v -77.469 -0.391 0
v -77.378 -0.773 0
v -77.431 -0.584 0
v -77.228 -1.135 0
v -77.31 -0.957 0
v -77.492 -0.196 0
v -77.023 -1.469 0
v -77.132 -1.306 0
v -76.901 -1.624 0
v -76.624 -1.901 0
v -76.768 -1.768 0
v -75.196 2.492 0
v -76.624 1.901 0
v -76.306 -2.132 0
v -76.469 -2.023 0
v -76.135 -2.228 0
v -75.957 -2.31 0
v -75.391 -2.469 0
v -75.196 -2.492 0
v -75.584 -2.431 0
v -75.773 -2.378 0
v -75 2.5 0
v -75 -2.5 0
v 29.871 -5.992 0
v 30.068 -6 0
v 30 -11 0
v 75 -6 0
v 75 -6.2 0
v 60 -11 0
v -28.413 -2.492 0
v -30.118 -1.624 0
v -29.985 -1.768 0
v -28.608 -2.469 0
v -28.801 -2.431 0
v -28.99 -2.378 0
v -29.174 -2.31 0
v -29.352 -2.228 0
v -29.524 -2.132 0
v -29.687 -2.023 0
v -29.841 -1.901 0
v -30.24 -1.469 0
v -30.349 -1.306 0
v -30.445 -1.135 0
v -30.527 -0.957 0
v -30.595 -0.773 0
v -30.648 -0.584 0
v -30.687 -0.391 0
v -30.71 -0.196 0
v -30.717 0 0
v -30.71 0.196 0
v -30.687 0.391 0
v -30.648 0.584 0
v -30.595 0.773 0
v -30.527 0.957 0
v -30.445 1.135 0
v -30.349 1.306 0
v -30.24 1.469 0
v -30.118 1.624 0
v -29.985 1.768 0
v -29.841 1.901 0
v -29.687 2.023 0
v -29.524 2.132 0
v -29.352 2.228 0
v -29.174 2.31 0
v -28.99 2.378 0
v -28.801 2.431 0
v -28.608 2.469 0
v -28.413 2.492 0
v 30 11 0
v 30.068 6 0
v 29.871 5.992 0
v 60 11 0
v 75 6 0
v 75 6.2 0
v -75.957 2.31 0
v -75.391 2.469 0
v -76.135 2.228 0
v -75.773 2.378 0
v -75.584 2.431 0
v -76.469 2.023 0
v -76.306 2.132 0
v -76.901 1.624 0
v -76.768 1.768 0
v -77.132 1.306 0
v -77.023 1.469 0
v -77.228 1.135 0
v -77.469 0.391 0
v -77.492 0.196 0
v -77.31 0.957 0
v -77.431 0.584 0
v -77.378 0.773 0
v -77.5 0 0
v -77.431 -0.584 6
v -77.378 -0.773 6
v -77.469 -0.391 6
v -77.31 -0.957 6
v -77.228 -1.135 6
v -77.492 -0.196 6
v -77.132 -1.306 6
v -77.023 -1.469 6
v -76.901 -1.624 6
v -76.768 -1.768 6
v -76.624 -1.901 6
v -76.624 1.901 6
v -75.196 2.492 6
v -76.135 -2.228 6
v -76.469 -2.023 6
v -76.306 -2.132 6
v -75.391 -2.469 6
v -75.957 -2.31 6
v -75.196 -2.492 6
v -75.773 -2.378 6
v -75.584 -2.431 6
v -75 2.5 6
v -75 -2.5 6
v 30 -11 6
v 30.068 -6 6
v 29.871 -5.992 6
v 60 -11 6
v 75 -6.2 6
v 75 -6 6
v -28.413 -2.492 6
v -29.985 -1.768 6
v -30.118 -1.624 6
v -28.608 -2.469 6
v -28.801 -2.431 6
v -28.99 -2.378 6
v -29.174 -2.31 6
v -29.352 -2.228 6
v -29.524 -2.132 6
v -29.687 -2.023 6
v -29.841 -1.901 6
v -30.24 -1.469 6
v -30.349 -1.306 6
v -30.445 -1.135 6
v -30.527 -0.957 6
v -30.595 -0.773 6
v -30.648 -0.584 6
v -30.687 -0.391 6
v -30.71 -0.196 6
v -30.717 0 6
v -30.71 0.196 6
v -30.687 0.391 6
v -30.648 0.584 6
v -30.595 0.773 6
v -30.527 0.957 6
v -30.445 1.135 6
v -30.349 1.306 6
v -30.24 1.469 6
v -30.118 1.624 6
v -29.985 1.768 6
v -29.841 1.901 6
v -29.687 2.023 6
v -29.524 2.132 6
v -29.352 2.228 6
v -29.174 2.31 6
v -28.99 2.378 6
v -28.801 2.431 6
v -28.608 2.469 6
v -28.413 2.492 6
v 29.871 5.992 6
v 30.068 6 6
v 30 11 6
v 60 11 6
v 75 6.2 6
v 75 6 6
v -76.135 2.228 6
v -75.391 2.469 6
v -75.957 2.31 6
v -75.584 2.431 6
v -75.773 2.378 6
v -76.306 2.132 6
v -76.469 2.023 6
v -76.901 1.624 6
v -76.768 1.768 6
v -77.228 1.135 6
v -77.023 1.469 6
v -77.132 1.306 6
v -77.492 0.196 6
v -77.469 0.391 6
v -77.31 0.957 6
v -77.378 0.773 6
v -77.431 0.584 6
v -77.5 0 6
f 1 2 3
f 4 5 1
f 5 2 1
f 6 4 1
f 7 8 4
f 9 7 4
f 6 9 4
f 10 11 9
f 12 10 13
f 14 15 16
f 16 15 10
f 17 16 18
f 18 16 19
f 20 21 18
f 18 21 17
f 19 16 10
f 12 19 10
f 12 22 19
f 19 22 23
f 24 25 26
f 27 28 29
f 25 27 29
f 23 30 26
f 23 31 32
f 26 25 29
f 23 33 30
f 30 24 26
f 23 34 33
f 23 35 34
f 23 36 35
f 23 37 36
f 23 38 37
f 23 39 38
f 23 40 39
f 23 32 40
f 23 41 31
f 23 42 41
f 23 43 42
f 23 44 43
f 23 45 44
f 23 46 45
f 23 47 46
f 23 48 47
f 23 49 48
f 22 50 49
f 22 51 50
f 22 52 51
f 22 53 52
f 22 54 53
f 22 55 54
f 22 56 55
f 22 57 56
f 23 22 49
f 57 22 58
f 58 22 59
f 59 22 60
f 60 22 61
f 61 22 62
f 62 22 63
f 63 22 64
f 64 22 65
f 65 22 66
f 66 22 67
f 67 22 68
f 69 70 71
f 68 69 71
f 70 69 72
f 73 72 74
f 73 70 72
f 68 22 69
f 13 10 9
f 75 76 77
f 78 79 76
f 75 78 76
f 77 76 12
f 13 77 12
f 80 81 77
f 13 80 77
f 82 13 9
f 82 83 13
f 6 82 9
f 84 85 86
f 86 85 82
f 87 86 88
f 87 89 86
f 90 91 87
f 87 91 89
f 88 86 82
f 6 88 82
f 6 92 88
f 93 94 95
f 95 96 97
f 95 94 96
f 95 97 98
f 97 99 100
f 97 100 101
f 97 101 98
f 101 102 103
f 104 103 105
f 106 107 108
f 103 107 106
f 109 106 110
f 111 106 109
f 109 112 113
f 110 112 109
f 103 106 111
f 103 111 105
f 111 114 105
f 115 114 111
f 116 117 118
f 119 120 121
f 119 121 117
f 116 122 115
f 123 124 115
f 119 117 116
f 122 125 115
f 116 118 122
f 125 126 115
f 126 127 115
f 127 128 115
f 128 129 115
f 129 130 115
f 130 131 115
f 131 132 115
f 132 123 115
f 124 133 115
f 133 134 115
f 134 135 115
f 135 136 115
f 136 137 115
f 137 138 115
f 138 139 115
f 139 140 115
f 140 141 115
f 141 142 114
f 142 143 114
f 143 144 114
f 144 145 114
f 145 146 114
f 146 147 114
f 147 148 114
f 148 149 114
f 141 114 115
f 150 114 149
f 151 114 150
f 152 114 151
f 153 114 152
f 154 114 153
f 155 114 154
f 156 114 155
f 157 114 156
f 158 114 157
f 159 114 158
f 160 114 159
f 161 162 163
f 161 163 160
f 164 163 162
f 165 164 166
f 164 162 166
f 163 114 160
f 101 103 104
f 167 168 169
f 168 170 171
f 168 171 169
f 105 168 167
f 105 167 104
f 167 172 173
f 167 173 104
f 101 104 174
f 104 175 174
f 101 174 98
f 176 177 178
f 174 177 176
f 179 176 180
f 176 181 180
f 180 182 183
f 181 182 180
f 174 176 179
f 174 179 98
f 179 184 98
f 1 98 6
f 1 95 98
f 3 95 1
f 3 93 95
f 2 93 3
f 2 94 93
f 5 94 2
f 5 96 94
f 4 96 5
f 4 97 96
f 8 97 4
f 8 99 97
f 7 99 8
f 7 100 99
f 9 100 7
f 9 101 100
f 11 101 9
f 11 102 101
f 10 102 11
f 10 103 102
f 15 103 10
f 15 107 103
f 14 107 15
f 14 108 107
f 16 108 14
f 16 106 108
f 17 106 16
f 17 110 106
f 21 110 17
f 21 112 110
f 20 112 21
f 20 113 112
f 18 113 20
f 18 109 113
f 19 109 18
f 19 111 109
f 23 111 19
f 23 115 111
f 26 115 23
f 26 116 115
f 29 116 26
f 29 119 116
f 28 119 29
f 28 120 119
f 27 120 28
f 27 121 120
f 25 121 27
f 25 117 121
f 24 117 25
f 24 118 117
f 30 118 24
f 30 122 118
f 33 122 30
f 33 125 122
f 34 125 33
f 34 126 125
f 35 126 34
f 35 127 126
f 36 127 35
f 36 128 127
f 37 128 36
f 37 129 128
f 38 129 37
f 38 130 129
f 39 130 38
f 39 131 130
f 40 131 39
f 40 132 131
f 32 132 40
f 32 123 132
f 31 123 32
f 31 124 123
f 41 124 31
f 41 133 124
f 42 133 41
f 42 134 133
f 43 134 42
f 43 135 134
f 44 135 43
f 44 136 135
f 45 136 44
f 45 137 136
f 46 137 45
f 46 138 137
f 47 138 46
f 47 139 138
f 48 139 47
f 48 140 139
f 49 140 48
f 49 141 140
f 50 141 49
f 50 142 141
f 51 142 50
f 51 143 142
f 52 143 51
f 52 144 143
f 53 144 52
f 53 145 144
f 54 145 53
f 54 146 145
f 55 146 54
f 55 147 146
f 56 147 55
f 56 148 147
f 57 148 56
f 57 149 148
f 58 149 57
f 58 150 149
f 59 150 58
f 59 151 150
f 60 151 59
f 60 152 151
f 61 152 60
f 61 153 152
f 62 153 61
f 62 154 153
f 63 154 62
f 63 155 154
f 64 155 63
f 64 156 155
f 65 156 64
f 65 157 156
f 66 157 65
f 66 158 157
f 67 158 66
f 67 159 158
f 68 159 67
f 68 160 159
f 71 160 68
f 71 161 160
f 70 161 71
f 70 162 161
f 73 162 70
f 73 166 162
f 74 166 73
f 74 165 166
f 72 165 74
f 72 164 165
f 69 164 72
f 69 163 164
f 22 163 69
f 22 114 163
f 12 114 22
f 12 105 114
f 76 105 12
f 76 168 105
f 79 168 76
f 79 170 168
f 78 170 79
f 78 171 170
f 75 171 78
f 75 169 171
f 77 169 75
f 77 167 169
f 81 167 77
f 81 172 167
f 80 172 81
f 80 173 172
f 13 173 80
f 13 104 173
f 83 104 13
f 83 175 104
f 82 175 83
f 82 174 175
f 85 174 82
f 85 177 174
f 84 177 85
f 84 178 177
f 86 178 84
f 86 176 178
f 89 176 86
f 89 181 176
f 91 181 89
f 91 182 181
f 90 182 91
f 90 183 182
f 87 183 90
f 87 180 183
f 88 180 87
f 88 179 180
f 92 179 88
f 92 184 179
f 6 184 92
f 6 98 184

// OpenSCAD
bodyDepth     = 6;      // [1:0.1:50]
bodyLength    = 150;    // [15:0.1:250]
bodyOpening   = 12;     // [1:0.1:50]
bodyThickness = 5;      // [0.5:0.1:20] 
jointLength   = 45;     // [1:0.1:100]
tipLength     = 15;     // [0:0.1:50]
hingeDepth    = 5;      // [1:0.1:50]
hingeFillet   = 2.5;    // [0:0.1:10]
blunt         = 0.2;    // [0.25:0.01:5]
overlap       = 0.01*1;
facets        = 80;

$fn=facets;
rotate( [0,0,270] )
  translate( [0,-bodyLength/2,0] )
    linear_extrude( height=bodyDepth )
      fillet(r=hingeFillet)
        union()
          { circle( bodyThickness/2 );
            leg();
            mirror()
              leg();
          }
  
module leg()
{ polygon(points=[[ bodyThickness/2              , 0                      ],
                  [ bodyThickness + bodyOpening/2, bodyLength-jointLength ],
                  [ bodyThickness + bodyOpening/2, bodyLength-tipLength   ],
                  [ bodyOpening/2+blunt          , bodyLength             ],
                  [ bodyOpening/2                , bodyLength             ],
                  [ bodyOpening/2                , bodyLength-jointLength ],
                  [ -overlap/2                   , hingeDepth             ],
                  [ -overlap/2                   , 0                      ]],
          paths =[[0,1,2,3,4,5,6,7,0]] );
}

// Copyright (c) 2013 Oskar Linde. All rights reserved.
// License: BSD
//
// This library contains basic 2D morphology operations
//
// outset(d=1)            - creates a polygon at an offset d outside a 2D shape
// inset(d=1)             - creates a polygon at an offset d inside a 2D shape
// fillet(r=1)            - adds fillets of radius r to all concave corners of a 2D shape
// rounding(r=1)          - adds rounding to all convex corners of a 2D shape
// shell(d,center=false)  - makes a shell of width d along the edge of a 2D shape
//                        - positive values of d places the shell on the outside
//                        - negative values of d places the shell on the inside
//                        - center=true and positive d places the shell centered on the edge

module outset(d=1) {
	// Bug workaround for older OpenSCAD versions
	if (version_num() < 20130424) render() outset_extruded(d) children();
	else minkowski() {
		circle(r=d);
		children();
	}
}

module outset_extruded(d=1) {
   projection(cut=true) minkowski() {
        cylinder(r=d);
        linear_extrude(center=true) children();
   }
}

module inset(d=1) {
	 render() inverse() outset(d=d) inverse() children();
}

module fillet(r=1) {
	inset(d=r) render() outset(d=r) children();
}

module rounding(r=1) {
	outset(d=r) inset(d=r) children();
}

module shell(d,center=false) {
	if (center && d > 0) {
		difference() {
			outset(d=d/2) children();
			inset(d=d/2) children();
		}
	}
	if (!center && d > 0) {
		difference() {
			outset(d=d) children();
			children();
		}
	}
	if (!center && d < 0) {
		difference() {
			children();
			inset(d=-d) children();
		}
	}
	if (d == 0) children();
}


// Below are for internal use only

module inverse() {
	difference() {
		square(1e5,center=true);
		children();
	}
}
